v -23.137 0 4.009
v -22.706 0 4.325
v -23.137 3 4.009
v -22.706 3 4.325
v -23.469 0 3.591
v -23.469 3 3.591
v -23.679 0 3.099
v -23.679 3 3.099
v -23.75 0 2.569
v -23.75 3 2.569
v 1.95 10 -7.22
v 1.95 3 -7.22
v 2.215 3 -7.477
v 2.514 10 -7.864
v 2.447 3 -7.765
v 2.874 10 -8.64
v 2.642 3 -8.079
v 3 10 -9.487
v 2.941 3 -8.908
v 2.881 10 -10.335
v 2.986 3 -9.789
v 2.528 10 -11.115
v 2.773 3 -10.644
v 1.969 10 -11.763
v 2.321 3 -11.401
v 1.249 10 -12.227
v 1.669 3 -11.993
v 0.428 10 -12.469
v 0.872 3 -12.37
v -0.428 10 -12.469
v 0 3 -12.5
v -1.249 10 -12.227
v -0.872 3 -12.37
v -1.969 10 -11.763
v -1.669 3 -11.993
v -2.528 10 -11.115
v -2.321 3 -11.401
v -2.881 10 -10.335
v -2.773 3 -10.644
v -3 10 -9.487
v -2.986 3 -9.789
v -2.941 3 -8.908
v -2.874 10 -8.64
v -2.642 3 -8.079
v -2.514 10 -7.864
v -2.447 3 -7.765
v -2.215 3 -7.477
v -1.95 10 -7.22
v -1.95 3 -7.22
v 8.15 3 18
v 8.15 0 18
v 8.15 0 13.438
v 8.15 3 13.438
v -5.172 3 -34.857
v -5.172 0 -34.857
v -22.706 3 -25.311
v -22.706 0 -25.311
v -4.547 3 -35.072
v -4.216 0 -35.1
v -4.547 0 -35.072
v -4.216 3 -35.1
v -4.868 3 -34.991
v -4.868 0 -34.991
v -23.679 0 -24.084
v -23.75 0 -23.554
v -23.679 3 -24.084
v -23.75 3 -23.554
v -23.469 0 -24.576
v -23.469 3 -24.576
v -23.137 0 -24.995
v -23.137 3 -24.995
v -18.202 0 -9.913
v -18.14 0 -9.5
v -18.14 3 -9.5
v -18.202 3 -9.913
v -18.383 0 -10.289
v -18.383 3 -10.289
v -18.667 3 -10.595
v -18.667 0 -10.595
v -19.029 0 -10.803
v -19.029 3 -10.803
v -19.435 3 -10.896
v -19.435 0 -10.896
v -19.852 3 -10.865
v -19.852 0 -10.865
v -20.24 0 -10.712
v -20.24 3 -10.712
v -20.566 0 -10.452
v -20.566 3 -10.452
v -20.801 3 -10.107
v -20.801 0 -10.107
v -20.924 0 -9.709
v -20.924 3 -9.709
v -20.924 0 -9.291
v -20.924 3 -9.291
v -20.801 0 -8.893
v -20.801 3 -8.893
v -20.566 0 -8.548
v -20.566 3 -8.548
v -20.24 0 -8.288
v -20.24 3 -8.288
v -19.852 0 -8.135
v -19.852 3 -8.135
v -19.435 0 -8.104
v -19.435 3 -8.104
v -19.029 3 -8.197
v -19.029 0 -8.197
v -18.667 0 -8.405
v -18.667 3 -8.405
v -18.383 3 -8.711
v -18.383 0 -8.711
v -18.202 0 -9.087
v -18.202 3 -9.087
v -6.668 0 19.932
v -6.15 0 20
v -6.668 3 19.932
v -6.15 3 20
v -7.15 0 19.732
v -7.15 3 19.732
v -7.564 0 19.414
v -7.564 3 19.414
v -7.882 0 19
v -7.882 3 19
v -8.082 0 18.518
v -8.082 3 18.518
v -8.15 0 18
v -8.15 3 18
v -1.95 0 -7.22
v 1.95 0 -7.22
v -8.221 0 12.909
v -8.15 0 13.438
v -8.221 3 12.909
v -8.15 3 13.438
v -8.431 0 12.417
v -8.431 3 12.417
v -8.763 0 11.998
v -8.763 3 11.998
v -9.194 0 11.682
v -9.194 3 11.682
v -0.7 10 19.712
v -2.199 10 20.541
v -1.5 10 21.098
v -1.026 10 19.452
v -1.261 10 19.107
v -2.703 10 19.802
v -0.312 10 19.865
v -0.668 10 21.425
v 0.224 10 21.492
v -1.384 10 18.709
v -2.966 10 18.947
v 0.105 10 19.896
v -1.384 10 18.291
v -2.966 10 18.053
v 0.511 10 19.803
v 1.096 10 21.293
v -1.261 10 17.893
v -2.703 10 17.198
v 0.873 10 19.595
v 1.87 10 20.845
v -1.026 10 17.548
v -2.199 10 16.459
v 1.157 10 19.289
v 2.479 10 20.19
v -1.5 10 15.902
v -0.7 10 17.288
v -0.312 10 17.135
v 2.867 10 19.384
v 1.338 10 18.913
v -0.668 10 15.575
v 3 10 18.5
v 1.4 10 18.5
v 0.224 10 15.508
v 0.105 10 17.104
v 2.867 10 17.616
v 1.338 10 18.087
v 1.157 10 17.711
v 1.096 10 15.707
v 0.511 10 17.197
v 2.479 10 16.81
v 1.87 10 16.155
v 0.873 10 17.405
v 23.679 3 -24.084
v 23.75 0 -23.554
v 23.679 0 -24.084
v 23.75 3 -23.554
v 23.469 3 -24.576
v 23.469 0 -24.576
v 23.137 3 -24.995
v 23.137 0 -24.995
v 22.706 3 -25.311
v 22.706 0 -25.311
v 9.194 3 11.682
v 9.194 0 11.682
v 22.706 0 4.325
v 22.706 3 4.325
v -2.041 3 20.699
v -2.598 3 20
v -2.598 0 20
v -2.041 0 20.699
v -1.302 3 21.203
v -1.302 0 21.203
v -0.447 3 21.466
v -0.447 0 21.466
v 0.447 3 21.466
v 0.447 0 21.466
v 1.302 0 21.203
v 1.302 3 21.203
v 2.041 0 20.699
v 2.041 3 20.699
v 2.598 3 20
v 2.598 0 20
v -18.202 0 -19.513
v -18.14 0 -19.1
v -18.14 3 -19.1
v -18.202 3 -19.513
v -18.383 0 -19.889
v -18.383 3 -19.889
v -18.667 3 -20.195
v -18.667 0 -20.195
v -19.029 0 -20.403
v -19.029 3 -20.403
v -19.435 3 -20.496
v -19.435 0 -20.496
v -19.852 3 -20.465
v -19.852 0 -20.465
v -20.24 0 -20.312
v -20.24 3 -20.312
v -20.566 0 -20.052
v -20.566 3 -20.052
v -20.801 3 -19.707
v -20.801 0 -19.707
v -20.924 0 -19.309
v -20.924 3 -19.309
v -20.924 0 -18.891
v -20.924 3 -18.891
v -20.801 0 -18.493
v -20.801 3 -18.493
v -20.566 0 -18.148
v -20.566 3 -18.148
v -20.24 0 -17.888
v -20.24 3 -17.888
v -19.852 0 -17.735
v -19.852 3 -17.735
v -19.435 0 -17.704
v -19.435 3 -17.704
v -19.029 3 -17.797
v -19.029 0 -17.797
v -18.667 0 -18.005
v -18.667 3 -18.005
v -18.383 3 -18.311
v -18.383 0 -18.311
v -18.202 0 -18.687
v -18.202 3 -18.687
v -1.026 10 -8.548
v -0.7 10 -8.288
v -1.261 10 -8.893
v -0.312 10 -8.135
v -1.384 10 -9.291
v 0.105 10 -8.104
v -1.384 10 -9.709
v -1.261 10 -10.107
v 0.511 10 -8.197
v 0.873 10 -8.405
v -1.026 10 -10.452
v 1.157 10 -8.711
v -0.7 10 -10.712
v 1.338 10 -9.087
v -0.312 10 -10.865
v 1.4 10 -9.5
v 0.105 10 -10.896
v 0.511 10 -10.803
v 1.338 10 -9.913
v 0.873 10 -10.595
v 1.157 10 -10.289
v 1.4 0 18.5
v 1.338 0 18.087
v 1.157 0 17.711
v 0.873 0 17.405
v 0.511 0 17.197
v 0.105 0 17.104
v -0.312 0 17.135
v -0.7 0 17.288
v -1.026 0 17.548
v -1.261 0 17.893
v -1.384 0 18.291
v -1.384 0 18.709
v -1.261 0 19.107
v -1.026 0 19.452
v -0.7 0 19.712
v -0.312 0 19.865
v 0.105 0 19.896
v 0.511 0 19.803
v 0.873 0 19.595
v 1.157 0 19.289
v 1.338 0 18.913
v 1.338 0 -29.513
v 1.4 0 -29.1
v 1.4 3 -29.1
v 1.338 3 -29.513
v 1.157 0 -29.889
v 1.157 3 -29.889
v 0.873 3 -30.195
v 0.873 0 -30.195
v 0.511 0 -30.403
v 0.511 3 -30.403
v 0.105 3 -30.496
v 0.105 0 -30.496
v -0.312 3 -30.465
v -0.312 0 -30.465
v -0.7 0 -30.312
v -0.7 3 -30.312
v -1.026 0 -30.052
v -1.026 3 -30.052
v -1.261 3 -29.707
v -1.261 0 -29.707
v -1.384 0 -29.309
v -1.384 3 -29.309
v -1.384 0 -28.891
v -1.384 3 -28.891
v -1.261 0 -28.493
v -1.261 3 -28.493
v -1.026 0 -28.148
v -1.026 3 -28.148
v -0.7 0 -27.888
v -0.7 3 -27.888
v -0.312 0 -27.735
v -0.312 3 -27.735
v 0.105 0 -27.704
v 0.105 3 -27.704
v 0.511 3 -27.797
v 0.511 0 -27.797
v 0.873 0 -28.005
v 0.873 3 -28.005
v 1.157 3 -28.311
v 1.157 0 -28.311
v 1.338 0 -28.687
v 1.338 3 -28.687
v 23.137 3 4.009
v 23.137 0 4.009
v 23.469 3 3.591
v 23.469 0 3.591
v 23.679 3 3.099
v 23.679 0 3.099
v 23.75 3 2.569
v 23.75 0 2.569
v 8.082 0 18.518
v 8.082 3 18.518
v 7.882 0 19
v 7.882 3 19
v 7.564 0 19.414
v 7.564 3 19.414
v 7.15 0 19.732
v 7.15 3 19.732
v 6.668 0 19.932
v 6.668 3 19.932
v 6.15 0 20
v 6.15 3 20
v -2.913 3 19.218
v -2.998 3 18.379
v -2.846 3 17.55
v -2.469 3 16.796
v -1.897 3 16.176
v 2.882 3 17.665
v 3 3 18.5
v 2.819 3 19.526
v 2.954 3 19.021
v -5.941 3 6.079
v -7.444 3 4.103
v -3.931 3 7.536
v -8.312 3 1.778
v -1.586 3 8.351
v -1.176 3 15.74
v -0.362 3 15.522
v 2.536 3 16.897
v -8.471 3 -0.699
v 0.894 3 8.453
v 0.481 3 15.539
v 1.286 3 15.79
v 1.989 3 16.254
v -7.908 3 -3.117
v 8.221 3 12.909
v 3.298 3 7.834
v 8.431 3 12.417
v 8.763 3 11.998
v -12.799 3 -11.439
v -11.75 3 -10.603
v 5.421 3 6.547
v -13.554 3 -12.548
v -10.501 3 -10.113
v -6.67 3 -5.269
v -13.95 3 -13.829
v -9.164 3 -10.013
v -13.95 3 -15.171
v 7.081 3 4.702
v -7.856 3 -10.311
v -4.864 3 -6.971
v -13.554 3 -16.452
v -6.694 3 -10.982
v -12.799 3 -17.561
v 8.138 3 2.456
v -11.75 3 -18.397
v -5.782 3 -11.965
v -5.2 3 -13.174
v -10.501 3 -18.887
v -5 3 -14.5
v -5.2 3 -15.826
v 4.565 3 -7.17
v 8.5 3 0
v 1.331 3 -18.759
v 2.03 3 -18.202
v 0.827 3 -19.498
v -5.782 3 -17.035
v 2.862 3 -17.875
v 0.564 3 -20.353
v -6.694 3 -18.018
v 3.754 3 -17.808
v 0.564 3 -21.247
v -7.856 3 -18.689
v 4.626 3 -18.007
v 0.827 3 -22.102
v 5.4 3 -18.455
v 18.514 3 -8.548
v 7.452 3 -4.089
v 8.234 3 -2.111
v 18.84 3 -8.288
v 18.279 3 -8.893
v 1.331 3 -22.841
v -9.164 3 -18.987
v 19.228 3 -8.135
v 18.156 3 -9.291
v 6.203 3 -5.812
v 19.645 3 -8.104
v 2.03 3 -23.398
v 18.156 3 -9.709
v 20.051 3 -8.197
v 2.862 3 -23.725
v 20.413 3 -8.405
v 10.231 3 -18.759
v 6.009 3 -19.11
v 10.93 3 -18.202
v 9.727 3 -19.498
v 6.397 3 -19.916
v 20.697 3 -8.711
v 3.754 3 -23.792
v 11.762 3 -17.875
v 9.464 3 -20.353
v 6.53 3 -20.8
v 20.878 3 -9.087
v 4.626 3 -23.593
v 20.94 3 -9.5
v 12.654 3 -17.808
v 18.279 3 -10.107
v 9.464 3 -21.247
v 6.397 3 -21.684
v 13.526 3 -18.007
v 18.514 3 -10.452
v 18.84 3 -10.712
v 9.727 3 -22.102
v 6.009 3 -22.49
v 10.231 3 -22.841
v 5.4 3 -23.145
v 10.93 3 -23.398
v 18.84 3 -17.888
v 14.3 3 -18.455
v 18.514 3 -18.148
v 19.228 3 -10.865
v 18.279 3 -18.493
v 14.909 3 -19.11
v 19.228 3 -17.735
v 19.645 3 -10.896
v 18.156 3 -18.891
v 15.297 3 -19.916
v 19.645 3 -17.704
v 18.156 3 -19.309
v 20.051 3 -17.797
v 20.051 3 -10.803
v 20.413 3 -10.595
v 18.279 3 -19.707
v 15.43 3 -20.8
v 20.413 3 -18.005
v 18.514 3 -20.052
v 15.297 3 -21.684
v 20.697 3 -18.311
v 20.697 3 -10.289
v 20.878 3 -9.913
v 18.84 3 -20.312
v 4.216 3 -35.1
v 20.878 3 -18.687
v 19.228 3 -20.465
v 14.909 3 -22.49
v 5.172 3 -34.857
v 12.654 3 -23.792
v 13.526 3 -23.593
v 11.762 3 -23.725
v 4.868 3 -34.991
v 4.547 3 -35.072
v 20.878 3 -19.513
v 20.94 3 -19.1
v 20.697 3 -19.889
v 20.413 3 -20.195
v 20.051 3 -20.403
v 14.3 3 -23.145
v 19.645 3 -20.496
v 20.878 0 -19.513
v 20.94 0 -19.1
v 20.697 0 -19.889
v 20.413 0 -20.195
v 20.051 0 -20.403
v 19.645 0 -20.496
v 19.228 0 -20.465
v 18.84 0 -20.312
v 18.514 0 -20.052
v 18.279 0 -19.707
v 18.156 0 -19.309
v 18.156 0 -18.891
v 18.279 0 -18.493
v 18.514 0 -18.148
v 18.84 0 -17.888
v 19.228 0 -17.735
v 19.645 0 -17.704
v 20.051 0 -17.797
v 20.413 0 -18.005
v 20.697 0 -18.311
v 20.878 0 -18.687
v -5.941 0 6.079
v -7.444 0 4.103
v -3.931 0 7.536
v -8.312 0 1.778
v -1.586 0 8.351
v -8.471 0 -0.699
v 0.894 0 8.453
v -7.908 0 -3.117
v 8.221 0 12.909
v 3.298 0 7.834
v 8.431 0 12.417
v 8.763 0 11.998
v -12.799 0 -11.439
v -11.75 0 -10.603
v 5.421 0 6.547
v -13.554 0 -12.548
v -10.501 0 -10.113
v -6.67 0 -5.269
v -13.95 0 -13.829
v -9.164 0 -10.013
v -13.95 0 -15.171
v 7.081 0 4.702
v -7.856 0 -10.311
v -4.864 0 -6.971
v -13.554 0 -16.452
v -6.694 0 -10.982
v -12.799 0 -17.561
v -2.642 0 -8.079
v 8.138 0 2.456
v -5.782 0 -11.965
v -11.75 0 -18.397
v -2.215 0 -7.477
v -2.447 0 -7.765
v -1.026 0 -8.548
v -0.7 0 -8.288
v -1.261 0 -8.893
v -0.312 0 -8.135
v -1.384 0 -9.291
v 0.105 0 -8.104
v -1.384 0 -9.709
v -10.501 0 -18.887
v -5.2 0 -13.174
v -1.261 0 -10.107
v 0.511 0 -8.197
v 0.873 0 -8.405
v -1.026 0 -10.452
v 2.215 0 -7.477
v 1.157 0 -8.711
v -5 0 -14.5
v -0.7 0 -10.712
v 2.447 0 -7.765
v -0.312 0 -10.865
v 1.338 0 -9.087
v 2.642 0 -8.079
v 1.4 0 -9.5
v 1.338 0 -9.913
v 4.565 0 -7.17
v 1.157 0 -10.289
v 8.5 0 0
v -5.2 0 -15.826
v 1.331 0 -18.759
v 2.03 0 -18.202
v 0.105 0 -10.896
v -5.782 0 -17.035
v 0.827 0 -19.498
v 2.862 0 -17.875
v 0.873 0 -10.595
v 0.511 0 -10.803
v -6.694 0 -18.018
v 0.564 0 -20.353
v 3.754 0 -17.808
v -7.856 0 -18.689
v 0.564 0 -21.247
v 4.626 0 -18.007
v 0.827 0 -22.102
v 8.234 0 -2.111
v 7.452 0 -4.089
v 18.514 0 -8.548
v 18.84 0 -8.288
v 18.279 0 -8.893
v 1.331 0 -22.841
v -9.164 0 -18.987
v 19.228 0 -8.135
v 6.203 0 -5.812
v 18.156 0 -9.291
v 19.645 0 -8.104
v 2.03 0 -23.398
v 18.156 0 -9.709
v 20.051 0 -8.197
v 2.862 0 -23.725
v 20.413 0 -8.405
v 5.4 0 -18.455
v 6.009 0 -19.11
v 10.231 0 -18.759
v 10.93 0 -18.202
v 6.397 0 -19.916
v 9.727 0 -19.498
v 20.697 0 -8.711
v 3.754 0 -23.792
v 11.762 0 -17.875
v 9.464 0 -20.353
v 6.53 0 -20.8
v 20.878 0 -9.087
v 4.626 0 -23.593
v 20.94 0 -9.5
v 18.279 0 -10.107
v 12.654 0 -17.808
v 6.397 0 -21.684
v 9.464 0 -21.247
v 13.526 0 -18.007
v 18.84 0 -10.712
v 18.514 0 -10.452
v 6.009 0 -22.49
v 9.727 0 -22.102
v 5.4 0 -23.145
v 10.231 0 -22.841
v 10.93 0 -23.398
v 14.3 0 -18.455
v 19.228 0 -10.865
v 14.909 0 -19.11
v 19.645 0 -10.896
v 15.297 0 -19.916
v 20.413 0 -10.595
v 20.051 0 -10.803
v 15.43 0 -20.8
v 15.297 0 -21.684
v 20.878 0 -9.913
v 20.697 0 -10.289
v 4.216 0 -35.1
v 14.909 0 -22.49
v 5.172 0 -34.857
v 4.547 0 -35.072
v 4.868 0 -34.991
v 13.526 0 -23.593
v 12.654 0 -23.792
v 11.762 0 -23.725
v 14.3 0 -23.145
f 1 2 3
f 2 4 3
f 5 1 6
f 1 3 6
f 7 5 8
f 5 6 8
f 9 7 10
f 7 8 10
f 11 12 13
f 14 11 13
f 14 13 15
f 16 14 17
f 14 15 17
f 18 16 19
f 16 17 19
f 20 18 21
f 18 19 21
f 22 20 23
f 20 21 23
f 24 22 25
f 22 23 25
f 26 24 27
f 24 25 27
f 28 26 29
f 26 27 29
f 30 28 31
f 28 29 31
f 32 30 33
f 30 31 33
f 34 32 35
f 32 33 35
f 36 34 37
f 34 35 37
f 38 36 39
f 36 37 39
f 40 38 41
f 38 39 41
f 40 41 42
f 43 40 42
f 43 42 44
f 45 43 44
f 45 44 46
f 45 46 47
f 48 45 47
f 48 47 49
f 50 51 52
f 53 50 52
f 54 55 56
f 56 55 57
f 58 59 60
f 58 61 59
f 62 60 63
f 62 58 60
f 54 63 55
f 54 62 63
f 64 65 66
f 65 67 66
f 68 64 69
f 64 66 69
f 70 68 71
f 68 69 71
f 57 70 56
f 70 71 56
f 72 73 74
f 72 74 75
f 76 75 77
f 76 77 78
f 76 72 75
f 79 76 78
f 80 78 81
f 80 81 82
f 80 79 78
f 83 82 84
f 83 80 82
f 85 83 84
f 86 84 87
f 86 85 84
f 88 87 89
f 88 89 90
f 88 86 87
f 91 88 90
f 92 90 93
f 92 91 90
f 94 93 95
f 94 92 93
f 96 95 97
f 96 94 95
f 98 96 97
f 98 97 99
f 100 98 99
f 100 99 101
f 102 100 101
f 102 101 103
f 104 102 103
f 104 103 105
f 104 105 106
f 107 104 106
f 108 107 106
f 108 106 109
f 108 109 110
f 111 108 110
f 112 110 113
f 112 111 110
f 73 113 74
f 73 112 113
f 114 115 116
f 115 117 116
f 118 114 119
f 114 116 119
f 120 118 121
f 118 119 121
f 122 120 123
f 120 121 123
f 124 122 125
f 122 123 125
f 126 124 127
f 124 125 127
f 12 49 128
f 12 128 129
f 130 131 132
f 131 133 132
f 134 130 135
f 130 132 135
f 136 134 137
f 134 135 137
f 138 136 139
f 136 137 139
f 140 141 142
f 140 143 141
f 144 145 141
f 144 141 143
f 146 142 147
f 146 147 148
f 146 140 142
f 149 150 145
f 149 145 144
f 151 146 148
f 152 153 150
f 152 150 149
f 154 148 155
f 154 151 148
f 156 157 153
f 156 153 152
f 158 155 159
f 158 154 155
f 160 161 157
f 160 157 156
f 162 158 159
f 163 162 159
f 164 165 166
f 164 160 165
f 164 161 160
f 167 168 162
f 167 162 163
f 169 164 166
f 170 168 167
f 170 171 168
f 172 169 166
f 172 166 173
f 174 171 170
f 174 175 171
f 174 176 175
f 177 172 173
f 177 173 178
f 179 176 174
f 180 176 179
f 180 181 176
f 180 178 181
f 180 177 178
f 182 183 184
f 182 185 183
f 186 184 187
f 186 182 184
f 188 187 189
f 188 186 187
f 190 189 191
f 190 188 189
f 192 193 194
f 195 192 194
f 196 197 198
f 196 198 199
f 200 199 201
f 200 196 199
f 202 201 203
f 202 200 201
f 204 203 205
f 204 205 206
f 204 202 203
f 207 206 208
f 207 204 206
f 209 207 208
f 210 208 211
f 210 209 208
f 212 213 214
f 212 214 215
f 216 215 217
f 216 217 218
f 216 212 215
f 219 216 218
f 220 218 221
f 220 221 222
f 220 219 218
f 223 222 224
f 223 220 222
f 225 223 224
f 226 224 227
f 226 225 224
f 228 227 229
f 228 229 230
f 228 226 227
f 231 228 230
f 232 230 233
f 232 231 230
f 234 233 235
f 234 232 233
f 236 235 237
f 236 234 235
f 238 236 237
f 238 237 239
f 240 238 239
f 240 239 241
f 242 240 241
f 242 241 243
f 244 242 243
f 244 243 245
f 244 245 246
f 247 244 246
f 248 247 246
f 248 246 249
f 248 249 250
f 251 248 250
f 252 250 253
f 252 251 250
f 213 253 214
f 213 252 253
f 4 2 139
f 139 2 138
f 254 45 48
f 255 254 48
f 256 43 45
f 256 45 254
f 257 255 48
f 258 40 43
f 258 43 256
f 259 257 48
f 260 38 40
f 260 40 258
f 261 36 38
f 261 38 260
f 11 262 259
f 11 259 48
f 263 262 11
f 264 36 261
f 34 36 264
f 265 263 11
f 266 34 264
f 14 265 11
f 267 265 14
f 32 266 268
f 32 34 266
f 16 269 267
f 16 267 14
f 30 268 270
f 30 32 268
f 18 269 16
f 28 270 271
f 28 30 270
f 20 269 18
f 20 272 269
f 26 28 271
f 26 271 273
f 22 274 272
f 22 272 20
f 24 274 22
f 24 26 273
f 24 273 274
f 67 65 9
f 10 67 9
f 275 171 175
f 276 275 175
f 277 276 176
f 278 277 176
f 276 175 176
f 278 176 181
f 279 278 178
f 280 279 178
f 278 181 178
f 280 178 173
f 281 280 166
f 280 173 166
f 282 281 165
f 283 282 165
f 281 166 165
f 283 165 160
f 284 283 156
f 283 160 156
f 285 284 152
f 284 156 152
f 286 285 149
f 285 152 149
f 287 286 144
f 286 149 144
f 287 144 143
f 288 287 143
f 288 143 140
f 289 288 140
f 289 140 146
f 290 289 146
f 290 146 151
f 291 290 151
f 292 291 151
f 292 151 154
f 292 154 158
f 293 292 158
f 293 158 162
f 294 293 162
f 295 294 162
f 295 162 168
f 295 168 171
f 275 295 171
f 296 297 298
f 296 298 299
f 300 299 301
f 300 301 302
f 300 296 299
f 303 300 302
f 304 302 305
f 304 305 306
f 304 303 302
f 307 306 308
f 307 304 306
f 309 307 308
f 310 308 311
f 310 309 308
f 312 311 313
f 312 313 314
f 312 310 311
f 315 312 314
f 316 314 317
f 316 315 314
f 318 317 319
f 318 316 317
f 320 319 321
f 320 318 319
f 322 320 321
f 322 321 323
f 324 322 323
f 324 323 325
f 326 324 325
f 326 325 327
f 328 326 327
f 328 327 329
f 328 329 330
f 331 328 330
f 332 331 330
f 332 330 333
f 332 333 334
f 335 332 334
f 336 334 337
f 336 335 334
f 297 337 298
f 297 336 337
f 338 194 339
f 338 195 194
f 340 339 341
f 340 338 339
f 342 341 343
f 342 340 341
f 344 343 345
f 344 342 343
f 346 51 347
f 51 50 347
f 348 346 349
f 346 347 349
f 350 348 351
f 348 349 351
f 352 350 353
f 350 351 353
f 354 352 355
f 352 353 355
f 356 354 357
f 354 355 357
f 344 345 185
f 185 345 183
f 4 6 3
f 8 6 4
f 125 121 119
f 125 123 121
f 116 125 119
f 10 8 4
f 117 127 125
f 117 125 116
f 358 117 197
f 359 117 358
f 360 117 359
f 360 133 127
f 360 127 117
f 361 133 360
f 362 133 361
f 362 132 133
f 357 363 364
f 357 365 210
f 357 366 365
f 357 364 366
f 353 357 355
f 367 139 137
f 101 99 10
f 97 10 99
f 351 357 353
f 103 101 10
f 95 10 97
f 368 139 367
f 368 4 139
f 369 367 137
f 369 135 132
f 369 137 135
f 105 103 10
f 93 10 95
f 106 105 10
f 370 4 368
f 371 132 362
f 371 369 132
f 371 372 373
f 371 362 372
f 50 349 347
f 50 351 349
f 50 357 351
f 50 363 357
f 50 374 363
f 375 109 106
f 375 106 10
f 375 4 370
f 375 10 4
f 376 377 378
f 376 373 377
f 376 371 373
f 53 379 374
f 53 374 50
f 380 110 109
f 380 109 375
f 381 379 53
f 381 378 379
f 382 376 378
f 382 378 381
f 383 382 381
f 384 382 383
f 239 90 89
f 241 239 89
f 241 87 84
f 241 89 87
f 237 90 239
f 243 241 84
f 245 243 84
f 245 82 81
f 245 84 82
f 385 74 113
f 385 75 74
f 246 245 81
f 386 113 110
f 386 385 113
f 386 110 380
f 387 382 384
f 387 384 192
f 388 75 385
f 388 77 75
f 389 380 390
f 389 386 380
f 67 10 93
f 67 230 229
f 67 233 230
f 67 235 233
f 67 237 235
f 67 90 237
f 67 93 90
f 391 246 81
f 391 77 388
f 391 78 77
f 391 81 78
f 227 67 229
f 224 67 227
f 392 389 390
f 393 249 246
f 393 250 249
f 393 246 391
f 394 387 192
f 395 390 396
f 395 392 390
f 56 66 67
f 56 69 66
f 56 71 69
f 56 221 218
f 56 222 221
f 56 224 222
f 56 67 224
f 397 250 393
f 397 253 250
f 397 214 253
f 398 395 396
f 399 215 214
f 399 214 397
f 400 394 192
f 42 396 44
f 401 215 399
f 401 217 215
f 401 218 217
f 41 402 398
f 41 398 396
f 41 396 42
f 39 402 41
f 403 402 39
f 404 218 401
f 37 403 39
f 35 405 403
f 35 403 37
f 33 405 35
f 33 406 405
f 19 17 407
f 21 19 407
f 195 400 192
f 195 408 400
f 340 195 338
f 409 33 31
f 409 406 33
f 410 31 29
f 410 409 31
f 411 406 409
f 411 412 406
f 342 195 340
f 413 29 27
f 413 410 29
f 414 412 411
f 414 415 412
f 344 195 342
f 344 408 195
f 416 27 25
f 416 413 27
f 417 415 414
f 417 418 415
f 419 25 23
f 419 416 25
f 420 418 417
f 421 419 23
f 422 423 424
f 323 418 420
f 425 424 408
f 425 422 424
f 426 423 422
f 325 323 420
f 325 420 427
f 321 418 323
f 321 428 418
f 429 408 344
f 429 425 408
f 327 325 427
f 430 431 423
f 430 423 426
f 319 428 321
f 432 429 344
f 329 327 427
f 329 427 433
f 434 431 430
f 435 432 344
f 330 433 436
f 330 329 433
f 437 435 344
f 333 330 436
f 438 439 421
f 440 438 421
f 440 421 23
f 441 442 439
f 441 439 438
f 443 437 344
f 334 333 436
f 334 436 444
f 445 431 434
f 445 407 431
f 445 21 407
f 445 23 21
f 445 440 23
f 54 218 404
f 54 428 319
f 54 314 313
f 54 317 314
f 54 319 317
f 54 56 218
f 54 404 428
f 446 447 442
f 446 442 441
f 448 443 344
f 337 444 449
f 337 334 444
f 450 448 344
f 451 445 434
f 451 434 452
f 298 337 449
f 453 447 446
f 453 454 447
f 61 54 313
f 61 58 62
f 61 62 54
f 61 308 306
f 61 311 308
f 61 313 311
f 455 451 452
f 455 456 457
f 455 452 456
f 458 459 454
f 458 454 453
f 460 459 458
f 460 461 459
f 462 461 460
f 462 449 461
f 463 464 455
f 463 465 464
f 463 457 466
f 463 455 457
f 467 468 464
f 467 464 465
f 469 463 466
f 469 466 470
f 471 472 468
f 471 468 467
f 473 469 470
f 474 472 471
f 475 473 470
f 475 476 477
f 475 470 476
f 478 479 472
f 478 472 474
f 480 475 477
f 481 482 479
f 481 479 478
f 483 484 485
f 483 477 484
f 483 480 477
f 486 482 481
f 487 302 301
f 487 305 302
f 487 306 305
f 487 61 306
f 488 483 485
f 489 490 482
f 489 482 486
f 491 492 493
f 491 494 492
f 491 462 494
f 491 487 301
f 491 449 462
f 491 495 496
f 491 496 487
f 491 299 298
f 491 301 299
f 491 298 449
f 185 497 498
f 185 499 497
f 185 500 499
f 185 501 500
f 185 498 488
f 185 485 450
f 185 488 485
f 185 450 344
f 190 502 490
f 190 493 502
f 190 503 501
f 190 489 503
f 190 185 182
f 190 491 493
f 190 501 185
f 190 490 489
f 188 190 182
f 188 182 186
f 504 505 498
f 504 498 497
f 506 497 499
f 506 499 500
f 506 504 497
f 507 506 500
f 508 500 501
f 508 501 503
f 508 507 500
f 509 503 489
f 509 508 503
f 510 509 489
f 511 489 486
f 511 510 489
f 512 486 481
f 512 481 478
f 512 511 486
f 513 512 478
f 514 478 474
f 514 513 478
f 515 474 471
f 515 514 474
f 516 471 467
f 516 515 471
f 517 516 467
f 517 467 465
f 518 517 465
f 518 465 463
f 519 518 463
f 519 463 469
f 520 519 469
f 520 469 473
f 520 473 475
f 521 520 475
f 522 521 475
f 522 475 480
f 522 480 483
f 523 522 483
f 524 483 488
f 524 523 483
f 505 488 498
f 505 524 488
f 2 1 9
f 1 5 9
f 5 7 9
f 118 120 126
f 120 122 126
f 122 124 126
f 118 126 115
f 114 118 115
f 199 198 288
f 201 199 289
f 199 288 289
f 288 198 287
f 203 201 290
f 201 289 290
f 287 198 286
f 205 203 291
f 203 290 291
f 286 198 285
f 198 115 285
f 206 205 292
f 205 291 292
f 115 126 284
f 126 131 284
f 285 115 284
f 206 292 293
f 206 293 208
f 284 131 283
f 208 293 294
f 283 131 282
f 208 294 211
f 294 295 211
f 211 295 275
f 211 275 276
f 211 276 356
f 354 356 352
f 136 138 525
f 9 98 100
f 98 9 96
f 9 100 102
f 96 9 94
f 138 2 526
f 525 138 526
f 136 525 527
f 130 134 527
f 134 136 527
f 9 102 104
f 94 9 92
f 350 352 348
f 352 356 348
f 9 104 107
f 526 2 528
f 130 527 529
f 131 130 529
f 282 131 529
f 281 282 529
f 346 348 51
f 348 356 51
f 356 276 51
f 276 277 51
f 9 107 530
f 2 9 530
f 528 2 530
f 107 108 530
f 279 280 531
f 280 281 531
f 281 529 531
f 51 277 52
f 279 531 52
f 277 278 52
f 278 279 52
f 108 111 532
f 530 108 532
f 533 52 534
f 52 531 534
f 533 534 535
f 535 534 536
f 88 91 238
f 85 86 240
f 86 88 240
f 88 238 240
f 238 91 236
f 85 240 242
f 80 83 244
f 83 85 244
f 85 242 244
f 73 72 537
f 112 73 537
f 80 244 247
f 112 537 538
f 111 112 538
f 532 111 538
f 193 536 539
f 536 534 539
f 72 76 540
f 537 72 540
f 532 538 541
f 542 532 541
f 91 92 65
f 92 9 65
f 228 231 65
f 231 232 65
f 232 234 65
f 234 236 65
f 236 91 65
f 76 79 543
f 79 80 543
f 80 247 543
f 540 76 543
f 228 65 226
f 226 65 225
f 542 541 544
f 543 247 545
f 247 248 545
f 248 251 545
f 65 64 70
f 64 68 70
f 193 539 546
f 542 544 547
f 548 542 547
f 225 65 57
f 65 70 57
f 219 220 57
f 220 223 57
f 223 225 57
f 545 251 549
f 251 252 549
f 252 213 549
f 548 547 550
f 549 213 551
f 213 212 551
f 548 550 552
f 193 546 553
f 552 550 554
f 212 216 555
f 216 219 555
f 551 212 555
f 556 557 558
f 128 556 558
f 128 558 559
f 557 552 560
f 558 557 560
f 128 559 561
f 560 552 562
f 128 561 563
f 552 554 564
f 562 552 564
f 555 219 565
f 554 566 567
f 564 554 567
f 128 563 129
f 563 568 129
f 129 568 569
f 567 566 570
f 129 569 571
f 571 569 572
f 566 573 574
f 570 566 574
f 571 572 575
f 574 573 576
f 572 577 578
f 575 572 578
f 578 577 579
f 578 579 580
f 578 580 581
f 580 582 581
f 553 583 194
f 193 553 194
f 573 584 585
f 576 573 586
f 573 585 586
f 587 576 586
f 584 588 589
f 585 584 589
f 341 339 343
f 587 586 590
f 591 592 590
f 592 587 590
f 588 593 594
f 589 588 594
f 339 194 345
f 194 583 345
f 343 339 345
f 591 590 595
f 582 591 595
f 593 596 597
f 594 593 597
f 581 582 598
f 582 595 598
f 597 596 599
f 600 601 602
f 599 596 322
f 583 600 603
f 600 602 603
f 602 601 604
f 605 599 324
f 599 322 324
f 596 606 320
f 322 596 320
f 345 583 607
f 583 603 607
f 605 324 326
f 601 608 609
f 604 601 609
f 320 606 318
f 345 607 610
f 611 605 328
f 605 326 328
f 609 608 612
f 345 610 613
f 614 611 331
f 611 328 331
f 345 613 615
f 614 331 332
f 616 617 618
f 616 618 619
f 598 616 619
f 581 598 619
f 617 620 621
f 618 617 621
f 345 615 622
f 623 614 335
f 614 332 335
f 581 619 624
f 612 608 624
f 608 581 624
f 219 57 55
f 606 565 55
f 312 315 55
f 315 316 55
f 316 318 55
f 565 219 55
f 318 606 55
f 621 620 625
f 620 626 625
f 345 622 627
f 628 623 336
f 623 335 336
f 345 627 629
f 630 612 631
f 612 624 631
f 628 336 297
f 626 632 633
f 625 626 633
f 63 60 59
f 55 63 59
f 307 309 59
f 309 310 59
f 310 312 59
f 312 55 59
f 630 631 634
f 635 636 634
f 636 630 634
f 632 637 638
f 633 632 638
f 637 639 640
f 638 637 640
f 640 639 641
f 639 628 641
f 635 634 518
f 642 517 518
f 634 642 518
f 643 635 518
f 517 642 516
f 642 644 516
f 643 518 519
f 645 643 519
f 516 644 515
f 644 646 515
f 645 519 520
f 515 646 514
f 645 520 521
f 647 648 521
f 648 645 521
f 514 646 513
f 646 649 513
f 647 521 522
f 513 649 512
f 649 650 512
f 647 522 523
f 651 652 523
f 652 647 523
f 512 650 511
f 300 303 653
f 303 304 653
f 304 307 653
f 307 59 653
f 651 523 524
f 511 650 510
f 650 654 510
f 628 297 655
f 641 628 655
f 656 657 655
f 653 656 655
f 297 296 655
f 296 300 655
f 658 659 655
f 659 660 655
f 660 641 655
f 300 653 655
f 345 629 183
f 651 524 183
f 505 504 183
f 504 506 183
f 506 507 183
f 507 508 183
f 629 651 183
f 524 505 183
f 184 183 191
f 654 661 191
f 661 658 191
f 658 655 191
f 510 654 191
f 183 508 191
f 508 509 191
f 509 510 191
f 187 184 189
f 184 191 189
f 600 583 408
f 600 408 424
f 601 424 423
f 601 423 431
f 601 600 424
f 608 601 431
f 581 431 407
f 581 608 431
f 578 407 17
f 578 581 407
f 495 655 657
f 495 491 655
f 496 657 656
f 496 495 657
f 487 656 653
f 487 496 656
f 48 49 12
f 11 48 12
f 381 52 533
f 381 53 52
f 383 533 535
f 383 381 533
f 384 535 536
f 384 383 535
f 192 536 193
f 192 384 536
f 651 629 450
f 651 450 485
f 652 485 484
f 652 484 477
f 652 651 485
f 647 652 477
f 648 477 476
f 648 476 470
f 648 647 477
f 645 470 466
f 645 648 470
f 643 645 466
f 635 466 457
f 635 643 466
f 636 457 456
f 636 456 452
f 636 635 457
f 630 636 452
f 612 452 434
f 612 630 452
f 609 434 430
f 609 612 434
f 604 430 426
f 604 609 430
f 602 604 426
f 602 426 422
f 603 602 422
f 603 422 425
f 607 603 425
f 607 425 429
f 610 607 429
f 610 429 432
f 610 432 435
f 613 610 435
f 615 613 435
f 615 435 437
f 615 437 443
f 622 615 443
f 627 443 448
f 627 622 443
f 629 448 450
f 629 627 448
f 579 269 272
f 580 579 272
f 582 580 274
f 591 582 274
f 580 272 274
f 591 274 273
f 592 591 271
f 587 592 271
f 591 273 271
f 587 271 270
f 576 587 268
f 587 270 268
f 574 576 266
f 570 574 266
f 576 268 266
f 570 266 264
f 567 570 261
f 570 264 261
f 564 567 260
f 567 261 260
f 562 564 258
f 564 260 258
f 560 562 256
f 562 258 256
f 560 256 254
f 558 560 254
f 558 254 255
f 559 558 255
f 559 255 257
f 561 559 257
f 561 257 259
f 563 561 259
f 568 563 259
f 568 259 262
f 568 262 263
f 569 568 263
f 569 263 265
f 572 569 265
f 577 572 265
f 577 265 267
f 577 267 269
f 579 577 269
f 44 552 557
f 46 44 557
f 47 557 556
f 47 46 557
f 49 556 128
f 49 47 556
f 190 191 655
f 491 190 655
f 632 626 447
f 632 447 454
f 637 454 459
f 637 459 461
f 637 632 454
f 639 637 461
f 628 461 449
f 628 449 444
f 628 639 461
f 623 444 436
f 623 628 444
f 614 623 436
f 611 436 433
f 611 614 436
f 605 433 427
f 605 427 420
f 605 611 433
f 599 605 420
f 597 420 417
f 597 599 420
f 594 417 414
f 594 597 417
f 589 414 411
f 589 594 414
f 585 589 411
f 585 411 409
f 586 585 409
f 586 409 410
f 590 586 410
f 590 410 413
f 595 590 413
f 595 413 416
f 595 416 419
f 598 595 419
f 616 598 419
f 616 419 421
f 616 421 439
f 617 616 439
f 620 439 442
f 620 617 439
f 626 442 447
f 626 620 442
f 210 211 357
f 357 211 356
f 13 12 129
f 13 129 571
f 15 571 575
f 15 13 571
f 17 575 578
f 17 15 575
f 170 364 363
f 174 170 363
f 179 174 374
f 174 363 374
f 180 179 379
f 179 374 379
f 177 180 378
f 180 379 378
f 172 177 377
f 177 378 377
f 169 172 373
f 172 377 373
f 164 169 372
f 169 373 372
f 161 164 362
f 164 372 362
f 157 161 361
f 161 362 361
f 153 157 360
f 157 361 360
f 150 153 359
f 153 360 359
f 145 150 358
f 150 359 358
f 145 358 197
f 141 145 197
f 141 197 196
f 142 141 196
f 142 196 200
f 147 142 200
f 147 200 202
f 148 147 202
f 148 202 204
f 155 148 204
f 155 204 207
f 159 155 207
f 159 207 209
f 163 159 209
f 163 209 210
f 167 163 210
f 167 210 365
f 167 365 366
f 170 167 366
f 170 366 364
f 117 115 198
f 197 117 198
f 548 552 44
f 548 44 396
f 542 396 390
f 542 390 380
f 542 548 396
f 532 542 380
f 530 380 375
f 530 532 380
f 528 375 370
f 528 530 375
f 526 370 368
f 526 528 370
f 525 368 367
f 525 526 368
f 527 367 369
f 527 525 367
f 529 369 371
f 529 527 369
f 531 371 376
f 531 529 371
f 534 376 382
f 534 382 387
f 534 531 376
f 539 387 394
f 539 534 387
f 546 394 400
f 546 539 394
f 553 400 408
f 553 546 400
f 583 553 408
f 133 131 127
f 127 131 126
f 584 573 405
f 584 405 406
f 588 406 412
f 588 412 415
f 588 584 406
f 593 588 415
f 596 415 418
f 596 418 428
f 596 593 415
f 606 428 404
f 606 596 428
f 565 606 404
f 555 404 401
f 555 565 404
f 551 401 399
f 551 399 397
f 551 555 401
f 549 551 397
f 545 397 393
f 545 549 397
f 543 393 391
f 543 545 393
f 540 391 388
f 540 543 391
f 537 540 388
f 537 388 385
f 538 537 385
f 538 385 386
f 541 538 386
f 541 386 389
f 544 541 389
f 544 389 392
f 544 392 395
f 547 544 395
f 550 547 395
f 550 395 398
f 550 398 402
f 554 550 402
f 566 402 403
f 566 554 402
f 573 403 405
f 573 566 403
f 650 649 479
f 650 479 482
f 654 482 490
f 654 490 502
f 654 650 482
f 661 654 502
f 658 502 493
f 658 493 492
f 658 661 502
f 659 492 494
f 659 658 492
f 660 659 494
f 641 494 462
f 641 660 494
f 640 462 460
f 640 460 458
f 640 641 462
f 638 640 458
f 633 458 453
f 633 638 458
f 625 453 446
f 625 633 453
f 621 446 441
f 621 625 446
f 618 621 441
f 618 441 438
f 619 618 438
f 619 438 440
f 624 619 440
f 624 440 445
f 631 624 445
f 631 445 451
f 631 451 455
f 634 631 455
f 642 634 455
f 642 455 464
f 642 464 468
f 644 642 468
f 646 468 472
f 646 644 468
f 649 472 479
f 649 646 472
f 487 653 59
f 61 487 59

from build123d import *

# Parameters (mm, degrees)
SKETCH_1_R               = 8.5
SKETCH_1_R_2             = 4.5
SKETCH_1_R_3             = 3
SKETCH_1_R_4             = 1.4
EXTRUDE_1_DEPTH          = 3
FILLET_1_R               = 2
SKETCH_2_R               = 3
EXTRUDE_2_DEPTH          = 7
EXTRUDE_2_DEPTH_BACK     = 3
SKETCH_3_R               = 1.4
CUT_EXTRUDE_1_DEPTH      = 1
CUT_EXTRUDE_1_DEPTH_BACK = 11


with BuildPart() as part:
    # Эскиз1 → Бобышка-Вытянуть1 (new body)
    with BuildSketch(Plane(origin=(0, 0, 0), x_dir=(1, 0, 0), z_dir=(0, 1, 0))):
        Polygon((8.15, -20), (8.15, -12.25), (23.75, -3.757292419), (23.75, 24.742707581), (4.725, 35.1), (-4.725, 35.1), (-23.75, 24.742707581), (-23.75, -3.757292419), (-8.15, -12.25), (-8.15, -20), align=None)
        Circle(SKETCH_1_R, mode=Mode.SUBTRACT)
        with Locations((-9.5, 14.5)):
            Circle(SKETCH_1_R_2, mode=Mode.SUBTRACT)
        with Locations((3.53, 20.8)):
            Circle(SKETCH_1_R_3, mode=Mode.SUBTRACT)
        with Locations((12.43, 20.8)):
            Circle(SKETCH_1_R_3, mode=Mode.SUBTRACT)
        with Locations((19.54, 19.1)):
            Circle(SKETCH_1_R_4, mode=Mode.SUBTRACT)
        with Locations((19.54, 9.5)):
            Circle(SKETCH_1_R_4, mode=Mode.SUBTRACT)
        with Locations((-19.54, 19.1)):
            Circle(SKETCH_1_R_4, mode=Mode.SUBTRACT)
        with Locations((-19.54, 9.5)):
            Circle(SKETCH_1_R_4, mode=Mode.SUBTRACT)
        with Locations((0, 29.1)):
            Circle(SKETCH_1_R_4, mode=Mode.SUBTRACT)
    extrude(amount=EXTRUDE_1_DEPTH)

    # Скругление1
    fillet_1_edges = [part.edges().sort_by_distance(p)[0] for p in [
        (-8.15, 1.5, 20),
        (-8.15, 1.5, 12.25),
        (-23.75, 1.5, 3.757292419),
        (-23.75, 1.5, -24.742707581),
        (-4.725, 1.5, -35.1),
        (4.725, 1.5, -35.1),
        (23.75, 1.5, -24.742707581),
        (23.75, 1.5, 3.757292419),
        (8.15, 1.5, 12.25),
        (8.15, 1.5, 20),
    ]]
    fillet(fillet_1_edges, radius=FILLET_1_R)

    # Эскиз2 → Бобышка-Вытянуть2 (add, two sides)
    with BuildSketch(Plane(origin=(0, 3, 0), x_dir=(1, 0, 0), z_dir=(0, 1, 0))) as extrude_2_sk:
        with Locations((0, -18.5)):
            Circle(SKETCH_2_R)
        with BuildLine():
            Line((-1.949769217, 7.22), (1.949769217, 7.22))
            ThreePointArc((1.949769217, 7.22), (0, 12.5), (-1.949769217, 7.22))
        make_face()
    extrude(amount=EXTRUDE_2_DEPTH)
    extrude(extrude_2_sk.sketch, amount=-EXTRUDE_2_DEPTH_BACK)

    # Эскиз3 → Вырез-Вытянуть1 (cut, two sides)
    with BuildSketch(Plane(origin=(0, 10, 0), x_dir=(1, 0, 0), z_dir=(0, 1, 0))) as cut_extrude_1_sk:
        with Locations((0, 9.5)):
            Circle(SKETCH_3_R)
        with Locations((0, -18.5)):
            Circle(SKETCH_3_R)
    extrude(amount=CUT_EXTRUDE_1_DEPTH, mode=Mode.SUBTRACT)
    extrude(cut_extrude_1_sk.sketch, amount=-CUT_EXTRUDE_1_DEPTH_BACK, mode=Mode.SUBTRACT)


solid = part.part
